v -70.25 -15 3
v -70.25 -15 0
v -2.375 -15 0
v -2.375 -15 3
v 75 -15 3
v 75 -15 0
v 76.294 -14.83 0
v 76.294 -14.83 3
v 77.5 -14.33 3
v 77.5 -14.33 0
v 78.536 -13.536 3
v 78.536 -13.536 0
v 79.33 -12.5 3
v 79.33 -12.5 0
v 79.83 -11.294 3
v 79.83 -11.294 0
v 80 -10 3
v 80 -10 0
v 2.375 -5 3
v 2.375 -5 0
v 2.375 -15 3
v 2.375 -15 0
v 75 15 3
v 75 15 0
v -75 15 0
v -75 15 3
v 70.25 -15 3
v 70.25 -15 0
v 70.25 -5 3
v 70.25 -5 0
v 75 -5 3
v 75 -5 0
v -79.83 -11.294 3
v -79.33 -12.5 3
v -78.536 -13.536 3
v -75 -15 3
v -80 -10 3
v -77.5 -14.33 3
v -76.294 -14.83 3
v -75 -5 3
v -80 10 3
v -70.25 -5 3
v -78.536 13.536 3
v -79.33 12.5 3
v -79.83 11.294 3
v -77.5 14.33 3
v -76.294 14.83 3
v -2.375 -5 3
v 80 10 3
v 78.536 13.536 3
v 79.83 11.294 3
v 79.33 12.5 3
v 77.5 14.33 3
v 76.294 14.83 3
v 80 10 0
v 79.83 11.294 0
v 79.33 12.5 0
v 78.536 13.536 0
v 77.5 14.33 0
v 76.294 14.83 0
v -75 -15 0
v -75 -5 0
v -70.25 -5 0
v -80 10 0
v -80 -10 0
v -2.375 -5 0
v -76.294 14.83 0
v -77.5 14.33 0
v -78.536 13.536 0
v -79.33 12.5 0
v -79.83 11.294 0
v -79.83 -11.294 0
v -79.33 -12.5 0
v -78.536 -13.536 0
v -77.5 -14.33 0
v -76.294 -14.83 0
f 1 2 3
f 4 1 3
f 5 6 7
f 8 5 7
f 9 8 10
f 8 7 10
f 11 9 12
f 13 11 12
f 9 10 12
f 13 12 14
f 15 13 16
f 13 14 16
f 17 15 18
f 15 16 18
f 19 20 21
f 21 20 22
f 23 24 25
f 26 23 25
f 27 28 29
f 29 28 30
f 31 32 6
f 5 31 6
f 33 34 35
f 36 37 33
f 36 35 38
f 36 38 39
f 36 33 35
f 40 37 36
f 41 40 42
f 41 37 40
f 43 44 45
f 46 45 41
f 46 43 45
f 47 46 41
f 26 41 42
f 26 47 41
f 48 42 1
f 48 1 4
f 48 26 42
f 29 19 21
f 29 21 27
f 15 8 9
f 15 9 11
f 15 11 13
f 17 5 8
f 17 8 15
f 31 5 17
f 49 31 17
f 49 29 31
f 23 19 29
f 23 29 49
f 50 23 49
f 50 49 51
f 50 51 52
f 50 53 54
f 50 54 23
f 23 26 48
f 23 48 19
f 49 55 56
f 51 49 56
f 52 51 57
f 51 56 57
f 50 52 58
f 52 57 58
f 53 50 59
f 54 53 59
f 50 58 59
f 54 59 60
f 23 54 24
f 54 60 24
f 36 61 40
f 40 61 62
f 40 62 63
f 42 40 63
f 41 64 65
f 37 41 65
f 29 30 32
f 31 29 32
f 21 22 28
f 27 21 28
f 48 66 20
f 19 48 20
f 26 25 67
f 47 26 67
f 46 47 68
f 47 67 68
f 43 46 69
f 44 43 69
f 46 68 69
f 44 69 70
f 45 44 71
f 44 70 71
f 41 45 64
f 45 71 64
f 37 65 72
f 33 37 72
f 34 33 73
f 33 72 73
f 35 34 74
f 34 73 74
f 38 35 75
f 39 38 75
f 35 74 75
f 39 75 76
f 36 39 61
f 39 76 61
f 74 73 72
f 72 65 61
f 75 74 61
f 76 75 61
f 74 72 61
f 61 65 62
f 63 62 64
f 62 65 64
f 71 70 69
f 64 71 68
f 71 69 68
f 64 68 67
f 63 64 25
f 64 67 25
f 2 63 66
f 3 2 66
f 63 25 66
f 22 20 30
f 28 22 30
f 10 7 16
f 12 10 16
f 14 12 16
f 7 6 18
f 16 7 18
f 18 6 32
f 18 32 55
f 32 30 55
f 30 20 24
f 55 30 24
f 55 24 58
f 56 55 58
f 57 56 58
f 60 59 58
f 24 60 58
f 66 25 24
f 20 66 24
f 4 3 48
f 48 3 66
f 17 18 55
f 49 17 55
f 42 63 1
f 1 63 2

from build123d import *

# Parameters (mm, degrees)
F1_DEPTH = 3


with BuildPart() as f1:
    # F0 (on Top) → F1 (new body)
    with BuildSketch(Plane.XY):
        with BuildLine():
            Line((75, 15), (-75, 15))
            ThreePointArc((-75, 15), (-78.535534, 13.535534), (-80, 10))
            Line((-80, 10), (-80, -10))
            ThreePointArc((-80, -10), (-78.535534, -13.535534), (-75, -15))
            Line((-75, -15), (-75, -5))
            Line((-75, -5), (-70.25, -5))
            Line((-70.25, -5), (-70.25, -15))
            Line((-70.25, -15), (-2.375, -15))
            Line((-2.375, -15), (-2.375, -5))
            Line((-2.375, -5), (2.375, -5))
            Line((2.375, -5), (2.375, -15))
            Line((2.375, -15), (70.25, -15))
            Line((70.25, -15), (70.25, -5))
            Line((70.25, -5), (75, -5))
            Line((75, -5), (75, -15))
            ThreePointArc((75, -15), (78.535534, -13.535534), (80, -10))
            Line((80, -10), (80, 10))
            ThreePointArc((80, 10), (78.535534, 13.535534), (75, 15))
        make_face()
    extrude(amount=F1_DEPTH)


solid = f1.part
